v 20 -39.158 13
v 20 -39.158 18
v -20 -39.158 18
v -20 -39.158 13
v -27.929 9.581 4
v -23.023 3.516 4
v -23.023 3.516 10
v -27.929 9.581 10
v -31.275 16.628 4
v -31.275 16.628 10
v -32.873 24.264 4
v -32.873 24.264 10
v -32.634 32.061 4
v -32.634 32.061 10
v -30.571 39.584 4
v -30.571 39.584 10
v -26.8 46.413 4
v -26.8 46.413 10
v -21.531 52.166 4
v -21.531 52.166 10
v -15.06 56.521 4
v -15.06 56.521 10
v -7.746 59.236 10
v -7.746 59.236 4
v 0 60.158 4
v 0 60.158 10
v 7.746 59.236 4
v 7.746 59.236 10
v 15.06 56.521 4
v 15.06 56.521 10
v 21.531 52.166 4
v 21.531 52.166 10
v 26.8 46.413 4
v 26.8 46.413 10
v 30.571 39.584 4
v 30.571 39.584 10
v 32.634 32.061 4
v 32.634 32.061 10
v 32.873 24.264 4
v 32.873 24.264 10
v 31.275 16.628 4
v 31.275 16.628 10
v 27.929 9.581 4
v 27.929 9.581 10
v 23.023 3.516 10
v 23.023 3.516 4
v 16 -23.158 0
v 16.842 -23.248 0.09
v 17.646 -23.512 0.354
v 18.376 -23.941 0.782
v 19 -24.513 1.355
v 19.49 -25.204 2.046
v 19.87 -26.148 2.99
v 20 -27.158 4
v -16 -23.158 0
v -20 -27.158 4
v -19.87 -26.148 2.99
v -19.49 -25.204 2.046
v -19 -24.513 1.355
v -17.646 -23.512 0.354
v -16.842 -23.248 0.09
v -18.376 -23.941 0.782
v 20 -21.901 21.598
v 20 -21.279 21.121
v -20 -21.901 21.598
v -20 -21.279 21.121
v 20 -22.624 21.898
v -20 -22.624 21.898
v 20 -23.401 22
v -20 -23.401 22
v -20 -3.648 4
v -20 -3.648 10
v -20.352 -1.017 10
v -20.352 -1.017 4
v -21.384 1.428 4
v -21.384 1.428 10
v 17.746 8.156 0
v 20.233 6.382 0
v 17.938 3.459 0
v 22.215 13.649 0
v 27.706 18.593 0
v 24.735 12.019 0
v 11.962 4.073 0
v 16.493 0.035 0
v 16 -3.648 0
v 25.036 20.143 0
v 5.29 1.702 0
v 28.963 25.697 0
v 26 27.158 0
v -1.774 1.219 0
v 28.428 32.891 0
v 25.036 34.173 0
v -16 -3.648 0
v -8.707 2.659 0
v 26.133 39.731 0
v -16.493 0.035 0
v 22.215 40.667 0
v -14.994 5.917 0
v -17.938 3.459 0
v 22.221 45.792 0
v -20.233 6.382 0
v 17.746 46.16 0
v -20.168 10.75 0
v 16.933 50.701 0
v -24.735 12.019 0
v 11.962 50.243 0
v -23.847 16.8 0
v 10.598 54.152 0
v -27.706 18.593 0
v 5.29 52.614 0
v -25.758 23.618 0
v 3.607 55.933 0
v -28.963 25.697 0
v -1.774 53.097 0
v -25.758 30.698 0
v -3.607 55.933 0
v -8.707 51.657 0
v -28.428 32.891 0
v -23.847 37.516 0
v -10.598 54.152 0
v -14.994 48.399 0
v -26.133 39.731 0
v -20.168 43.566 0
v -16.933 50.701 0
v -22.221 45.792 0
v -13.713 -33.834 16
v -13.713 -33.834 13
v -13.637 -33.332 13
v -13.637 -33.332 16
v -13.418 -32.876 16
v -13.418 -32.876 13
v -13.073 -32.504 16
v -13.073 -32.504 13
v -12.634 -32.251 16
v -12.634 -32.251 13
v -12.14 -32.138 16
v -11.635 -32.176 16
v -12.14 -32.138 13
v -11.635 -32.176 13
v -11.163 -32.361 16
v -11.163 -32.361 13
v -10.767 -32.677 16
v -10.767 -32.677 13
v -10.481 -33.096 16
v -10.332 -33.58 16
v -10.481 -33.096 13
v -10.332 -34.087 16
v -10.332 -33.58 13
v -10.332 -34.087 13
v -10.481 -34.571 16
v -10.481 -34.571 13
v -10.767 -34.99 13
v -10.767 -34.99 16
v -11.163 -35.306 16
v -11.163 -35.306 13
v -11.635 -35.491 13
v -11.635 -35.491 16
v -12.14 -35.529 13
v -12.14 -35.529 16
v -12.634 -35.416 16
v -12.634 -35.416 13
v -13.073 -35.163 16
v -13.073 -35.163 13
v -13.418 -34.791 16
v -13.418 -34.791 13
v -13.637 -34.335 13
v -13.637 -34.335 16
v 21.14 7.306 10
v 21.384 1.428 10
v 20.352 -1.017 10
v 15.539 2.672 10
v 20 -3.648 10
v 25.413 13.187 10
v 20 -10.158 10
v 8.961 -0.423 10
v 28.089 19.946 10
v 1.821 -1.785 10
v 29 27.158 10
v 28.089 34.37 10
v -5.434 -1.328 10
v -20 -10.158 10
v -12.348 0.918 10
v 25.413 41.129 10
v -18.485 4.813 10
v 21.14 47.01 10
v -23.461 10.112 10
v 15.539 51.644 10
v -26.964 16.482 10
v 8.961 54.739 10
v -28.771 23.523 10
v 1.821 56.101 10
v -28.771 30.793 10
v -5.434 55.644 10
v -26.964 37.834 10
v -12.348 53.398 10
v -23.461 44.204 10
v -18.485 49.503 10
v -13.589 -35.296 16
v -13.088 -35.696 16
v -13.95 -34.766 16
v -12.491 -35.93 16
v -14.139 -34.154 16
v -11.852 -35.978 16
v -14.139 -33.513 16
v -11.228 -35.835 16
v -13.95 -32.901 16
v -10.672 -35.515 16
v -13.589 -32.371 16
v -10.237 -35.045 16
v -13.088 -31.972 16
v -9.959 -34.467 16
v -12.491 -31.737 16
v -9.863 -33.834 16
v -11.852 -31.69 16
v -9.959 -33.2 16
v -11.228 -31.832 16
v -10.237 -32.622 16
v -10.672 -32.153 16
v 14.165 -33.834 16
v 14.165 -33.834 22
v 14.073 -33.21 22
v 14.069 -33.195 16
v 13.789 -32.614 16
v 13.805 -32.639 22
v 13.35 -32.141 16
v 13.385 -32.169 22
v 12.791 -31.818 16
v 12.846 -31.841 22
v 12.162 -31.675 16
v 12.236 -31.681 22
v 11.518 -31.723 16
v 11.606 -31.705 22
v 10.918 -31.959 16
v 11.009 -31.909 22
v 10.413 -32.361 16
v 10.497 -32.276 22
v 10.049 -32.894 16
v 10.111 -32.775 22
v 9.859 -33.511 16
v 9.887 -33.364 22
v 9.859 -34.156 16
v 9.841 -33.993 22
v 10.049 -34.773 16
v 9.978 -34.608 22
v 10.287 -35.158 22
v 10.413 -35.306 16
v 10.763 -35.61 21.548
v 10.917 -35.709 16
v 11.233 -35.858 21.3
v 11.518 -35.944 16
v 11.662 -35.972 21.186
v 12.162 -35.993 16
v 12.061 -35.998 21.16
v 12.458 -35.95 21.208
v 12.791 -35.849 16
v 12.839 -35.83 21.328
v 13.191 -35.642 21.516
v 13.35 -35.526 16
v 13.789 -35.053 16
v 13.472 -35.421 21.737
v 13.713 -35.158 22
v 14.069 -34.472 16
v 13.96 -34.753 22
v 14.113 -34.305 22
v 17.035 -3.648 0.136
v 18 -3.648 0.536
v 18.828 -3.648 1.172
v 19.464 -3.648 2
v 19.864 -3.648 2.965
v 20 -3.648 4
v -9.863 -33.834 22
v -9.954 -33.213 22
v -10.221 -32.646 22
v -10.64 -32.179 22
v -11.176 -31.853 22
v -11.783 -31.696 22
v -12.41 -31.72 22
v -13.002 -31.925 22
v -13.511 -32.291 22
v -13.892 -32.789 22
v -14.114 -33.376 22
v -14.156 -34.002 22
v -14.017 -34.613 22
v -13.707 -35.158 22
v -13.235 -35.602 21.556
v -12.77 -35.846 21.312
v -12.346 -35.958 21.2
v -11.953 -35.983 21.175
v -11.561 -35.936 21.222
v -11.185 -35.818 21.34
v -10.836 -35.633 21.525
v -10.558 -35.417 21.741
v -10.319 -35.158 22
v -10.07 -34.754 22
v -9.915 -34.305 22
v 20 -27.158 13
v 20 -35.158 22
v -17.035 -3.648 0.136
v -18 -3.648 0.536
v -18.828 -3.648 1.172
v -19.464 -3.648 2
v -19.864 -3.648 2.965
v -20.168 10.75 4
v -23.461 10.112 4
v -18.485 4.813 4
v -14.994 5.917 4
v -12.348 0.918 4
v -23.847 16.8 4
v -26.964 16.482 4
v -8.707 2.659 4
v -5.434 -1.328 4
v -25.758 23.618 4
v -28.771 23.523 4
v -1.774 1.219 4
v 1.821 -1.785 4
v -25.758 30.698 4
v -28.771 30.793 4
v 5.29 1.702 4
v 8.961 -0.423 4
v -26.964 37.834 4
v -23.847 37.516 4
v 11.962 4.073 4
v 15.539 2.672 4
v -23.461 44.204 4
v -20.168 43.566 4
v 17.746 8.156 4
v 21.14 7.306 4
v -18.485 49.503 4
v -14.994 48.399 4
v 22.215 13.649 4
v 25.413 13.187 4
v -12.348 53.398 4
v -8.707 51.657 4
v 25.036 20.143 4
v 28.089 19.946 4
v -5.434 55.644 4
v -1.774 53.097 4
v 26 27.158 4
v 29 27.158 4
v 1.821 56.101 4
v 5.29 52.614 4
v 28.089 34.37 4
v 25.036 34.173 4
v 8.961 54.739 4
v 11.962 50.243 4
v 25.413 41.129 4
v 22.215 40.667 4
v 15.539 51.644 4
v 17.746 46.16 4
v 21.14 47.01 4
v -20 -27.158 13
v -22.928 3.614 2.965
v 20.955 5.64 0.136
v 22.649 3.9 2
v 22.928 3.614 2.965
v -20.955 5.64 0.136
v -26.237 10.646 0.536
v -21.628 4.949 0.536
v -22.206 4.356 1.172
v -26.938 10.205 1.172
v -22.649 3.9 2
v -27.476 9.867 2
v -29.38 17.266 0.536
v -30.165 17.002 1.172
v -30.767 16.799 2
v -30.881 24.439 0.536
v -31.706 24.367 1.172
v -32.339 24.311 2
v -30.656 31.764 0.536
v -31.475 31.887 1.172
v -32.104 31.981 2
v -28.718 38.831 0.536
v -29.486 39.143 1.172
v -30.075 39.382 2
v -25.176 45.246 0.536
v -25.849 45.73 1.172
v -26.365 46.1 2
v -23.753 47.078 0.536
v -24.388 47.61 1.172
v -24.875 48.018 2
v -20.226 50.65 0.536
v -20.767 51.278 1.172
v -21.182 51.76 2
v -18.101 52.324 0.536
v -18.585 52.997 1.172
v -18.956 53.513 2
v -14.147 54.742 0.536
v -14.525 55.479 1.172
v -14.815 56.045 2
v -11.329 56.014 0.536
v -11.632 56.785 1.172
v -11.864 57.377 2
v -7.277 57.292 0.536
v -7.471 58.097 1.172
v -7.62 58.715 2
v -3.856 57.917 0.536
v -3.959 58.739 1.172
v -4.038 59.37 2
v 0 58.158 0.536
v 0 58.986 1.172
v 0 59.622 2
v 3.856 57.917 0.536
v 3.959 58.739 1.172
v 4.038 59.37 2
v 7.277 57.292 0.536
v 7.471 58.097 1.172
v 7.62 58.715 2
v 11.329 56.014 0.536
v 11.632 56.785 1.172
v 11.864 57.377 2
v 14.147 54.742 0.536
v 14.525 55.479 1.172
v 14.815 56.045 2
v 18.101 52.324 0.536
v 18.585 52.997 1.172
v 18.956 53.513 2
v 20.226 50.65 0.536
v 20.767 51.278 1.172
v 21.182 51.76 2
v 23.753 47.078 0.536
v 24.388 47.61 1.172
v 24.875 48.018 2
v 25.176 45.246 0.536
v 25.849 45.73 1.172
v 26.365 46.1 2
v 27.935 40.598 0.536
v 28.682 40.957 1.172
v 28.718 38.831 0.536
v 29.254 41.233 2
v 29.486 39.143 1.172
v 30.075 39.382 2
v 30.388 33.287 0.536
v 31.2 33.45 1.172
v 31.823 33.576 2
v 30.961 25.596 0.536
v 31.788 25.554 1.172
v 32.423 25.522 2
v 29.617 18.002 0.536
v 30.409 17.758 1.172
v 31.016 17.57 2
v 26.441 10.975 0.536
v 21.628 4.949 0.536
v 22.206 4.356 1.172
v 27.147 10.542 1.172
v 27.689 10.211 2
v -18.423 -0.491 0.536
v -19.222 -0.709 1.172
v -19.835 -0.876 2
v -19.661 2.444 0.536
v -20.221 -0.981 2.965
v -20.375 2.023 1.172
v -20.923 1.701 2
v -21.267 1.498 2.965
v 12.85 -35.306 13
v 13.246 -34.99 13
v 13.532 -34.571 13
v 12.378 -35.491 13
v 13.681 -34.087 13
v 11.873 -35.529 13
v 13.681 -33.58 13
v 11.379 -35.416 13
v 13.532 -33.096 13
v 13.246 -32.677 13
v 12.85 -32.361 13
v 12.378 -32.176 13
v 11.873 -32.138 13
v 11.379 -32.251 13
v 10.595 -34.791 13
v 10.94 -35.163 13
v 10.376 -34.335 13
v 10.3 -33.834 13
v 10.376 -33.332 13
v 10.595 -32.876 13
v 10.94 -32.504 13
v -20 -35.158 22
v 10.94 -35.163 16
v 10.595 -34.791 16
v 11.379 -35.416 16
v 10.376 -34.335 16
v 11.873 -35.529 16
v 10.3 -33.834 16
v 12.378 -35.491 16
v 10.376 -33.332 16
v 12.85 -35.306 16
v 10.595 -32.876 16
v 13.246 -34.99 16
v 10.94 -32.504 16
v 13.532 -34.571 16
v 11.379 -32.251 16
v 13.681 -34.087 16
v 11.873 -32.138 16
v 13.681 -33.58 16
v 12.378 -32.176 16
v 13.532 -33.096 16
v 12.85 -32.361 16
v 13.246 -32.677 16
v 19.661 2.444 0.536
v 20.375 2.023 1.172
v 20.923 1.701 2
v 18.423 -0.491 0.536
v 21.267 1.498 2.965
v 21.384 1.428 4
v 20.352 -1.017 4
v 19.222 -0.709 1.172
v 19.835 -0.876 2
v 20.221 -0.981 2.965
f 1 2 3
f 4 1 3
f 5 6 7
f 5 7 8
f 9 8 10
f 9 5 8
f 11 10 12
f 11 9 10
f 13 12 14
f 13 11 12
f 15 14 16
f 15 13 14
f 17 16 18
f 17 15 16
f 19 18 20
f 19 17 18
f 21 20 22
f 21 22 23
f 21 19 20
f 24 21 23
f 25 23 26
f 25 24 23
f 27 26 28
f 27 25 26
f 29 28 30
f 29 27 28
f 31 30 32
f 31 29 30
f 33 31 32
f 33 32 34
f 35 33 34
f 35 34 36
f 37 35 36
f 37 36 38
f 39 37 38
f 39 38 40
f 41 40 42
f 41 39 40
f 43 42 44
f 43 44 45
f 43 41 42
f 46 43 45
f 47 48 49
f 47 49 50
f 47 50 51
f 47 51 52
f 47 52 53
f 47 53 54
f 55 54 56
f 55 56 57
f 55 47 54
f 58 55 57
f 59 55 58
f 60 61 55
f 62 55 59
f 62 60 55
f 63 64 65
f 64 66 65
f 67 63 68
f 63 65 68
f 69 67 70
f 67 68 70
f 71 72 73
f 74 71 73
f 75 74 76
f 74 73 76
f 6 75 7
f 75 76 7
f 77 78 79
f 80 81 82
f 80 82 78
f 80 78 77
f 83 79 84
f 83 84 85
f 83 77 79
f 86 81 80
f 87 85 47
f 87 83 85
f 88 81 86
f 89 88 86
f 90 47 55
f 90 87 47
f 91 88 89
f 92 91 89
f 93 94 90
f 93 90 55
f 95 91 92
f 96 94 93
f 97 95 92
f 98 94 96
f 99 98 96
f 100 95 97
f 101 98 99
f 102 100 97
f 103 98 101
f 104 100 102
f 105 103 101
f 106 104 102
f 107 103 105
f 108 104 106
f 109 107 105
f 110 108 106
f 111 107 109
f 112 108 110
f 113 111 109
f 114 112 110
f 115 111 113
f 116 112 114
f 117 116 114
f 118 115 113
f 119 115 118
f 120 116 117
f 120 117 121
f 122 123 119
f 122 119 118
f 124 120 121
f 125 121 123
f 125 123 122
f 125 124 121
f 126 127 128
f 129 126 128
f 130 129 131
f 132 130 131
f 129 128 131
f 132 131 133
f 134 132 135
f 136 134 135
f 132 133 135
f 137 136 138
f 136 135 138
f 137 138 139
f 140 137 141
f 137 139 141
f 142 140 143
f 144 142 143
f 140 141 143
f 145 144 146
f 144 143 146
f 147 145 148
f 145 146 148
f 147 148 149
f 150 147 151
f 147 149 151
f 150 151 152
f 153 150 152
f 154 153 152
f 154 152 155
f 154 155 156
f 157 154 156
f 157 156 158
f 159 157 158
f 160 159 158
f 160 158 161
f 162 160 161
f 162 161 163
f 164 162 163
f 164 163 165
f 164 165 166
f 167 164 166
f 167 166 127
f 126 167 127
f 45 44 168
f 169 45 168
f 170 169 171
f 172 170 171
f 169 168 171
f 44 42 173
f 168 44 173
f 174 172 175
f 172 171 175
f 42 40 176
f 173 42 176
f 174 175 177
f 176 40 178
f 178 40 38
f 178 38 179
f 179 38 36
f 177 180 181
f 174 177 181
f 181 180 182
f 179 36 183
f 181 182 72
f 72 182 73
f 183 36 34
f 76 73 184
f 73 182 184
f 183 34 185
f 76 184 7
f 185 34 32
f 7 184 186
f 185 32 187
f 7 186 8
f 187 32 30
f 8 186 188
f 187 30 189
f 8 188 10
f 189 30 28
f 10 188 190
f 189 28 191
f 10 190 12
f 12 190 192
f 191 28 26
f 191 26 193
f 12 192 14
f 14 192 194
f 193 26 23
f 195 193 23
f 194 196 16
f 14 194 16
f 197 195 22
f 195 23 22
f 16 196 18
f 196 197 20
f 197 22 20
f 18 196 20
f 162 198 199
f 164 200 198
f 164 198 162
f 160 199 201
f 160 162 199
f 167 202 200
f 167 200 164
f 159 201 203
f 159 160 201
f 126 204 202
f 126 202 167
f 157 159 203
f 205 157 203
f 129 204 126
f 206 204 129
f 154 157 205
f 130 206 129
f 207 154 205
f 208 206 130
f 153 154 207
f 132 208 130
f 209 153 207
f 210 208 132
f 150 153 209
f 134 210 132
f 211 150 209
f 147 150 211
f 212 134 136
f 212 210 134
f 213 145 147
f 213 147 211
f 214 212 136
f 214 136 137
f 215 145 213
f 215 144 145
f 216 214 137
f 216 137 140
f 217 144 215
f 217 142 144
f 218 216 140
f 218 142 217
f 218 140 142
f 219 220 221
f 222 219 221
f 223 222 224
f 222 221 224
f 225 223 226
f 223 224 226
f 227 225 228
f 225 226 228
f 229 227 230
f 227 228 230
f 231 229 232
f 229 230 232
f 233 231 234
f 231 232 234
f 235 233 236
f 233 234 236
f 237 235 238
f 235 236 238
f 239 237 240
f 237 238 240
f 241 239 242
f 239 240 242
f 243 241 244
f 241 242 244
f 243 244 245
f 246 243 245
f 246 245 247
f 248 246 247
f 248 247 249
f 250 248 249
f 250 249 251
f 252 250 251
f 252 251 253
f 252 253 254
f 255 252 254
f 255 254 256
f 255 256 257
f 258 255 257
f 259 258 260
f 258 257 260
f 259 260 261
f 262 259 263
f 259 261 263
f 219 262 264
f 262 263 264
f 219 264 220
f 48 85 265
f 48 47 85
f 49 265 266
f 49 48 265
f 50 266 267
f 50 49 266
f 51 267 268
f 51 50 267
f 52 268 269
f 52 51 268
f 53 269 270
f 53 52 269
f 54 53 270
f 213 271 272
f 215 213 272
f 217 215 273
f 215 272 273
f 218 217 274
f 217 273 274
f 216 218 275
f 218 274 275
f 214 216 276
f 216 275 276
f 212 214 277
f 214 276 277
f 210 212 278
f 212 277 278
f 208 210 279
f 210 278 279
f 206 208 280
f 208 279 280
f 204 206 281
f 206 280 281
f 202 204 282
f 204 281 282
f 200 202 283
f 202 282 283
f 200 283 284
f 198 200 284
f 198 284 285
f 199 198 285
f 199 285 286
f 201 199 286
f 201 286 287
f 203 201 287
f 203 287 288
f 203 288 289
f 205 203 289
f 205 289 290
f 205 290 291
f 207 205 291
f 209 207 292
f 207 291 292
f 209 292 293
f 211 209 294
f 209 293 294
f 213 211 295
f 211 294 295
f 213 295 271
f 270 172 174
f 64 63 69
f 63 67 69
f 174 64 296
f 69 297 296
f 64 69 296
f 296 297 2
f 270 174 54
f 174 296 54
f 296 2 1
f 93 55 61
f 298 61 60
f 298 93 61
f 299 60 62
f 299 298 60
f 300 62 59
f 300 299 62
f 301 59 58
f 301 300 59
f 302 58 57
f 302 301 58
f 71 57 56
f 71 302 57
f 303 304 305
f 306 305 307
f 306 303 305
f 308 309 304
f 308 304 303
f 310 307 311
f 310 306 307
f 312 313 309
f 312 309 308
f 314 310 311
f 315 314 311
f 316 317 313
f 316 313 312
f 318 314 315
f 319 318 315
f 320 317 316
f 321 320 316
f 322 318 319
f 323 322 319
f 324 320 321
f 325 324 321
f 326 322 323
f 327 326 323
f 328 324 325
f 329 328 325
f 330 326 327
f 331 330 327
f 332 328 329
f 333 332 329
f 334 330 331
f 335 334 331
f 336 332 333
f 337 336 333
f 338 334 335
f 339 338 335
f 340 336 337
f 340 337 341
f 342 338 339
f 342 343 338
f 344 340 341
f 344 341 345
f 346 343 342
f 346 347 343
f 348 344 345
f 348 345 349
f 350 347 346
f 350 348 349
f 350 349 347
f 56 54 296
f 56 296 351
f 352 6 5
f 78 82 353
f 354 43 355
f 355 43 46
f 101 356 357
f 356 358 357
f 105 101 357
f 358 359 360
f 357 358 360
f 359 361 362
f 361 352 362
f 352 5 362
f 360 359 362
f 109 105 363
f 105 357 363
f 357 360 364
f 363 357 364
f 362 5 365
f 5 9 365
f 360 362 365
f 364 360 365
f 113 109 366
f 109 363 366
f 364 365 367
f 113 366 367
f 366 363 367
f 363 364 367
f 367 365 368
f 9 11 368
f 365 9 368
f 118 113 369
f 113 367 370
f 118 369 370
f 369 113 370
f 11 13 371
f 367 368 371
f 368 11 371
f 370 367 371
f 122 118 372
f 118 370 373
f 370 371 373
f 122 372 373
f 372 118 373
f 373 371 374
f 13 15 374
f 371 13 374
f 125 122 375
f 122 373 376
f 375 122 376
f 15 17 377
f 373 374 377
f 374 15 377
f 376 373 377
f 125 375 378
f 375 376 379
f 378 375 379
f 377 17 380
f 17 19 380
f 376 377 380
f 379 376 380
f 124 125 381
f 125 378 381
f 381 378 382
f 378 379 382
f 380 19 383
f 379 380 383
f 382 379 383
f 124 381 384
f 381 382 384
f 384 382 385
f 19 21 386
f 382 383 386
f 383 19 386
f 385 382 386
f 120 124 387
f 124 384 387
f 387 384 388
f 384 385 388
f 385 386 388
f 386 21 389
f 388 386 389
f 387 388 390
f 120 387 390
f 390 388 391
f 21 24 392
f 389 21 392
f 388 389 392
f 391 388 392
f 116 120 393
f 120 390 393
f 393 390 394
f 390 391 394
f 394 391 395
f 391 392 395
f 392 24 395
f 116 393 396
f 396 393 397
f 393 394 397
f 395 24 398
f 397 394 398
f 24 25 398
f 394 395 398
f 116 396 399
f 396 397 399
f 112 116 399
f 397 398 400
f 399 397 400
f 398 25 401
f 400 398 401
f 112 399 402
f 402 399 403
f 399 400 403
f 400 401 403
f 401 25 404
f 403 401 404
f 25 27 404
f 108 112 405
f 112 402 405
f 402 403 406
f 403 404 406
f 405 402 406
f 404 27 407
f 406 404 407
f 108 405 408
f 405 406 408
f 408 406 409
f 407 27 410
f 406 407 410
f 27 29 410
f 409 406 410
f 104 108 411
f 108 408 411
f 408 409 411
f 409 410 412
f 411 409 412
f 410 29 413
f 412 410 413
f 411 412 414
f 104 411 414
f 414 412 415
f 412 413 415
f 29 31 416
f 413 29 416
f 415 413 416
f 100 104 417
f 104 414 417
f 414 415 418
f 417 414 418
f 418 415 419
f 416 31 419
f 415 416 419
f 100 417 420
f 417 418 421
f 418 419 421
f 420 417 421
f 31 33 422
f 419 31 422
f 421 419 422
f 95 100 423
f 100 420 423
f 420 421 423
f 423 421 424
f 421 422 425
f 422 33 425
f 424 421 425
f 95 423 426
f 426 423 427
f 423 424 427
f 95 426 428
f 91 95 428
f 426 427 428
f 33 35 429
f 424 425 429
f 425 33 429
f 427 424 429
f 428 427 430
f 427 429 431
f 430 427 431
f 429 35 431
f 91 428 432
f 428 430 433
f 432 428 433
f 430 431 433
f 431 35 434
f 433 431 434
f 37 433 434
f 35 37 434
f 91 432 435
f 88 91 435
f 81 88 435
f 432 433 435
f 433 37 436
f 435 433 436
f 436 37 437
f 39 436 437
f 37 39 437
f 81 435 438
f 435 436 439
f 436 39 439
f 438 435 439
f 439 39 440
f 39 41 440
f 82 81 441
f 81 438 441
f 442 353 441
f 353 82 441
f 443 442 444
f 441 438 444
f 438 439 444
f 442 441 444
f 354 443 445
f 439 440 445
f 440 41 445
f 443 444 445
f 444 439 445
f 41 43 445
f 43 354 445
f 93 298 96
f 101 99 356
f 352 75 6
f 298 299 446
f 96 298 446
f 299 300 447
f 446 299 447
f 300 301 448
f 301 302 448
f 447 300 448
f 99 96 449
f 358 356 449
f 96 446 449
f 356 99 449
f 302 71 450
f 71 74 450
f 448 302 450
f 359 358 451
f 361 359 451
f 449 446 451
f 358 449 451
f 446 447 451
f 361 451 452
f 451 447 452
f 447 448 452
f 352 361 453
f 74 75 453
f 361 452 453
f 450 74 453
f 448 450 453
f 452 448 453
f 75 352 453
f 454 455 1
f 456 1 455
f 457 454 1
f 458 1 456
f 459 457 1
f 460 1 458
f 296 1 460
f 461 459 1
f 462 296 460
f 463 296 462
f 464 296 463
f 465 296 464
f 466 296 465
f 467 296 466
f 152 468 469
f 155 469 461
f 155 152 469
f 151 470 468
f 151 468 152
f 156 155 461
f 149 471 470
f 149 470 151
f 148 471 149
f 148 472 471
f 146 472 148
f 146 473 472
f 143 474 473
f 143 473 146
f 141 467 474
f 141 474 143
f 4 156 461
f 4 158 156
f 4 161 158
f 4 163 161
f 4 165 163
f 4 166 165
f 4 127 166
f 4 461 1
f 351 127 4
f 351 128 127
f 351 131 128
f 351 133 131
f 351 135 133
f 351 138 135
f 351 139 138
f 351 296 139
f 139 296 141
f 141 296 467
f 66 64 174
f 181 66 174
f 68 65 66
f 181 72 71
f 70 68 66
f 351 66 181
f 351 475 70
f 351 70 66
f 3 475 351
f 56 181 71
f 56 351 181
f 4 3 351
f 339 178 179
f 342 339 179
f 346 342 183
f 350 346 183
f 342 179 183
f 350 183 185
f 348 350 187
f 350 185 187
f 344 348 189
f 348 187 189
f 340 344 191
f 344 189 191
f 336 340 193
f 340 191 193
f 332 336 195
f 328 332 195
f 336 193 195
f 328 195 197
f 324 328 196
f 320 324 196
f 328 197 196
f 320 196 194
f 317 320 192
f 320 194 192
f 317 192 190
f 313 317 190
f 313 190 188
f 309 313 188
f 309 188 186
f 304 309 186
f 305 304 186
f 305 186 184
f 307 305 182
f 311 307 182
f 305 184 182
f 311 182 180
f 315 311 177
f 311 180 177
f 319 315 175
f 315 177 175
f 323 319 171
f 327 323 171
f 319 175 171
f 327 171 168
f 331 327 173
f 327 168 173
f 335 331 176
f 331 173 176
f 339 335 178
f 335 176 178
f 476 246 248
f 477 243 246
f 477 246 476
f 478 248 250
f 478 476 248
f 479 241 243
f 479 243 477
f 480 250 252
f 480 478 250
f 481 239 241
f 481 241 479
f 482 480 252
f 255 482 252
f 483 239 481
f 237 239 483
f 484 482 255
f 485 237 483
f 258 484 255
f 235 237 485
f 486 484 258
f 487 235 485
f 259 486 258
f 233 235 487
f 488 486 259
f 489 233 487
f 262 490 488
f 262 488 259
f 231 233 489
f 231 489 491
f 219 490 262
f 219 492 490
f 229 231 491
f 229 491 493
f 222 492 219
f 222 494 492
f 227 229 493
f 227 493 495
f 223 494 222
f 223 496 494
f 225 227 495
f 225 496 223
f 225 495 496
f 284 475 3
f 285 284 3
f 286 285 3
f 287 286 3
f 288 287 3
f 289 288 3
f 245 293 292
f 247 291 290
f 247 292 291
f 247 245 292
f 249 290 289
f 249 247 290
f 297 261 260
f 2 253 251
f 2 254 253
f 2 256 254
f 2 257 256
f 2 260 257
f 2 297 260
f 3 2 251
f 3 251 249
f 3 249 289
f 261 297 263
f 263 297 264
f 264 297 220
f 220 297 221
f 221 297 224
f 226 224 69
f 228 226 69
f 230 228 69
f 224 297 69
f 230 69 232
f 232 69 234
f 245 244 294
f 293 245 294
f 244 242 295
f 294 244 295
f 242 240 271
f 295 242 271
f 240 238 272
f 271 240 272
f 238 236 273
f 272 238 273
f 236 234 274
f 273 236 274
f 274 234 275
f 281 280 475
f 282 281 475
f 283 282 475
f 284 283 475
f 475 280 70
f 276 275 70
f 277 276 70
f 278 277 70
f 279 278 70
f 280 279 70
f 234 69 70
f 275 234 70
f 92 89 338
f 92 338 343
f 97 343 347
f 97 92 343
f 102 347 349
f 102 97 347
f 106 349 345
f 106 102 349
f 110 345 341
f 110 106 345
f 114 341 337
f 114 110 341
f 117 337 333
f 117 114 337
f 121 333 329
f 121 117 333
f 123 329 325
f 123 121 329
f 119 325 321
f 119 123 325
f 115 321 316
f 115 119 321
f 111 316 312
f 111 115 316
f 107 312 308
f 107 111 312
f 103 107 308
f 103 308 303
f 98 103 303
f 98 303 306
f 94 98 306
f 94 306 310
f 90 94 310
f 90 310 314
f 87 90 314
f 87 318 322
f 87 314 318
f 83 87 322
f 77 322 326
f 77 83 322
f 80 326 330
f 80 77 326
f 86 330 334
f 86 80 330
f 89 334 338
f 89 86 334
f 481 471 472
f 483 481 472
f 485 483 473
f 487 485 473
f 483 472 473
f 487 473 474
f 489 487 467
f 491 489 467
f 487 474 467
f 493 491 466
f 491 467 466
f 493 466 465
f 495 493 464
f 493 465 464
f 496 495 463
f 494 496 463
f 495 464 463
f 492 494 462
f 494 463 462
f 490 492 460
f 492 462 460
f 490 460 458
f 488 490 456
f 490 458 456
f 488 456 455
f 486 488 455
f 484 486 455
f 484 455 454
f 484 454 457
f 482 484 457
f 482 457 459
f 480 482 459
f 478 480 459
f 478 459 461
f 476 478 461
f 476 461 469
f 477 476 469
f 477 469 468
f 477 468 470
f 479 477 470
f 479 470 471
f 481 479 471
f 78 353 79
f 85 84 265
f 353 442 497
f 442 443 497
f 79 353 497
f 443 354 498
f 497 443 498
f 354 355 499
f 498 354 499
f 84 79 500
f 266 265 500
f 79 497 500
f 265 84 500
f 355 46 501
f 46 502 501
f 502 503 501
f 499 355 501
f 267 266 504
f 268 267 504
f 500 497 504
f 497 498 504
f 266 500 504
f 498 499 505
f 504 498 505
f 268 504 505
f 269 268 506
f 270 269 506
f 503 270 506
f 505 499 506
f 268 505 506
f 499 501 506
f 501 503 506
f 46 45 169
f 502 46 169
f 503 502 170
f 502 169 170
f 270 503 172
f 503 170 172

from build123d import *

# Parameters (mm, degrees)
SKETCH_1_R          = 26
EXTRUDE_1_DEPTH     = 10
SKETCH_3_R          = 29
CUT_EXTRUDE_1_DEPTH = 6
SKETCH_4_W          = 40
SKETCH_4_H          = 12
EXTRUDE_2_DEPTH     = 12
SKETCH_5_W          = 40
SKETCH_5_H          = 12
EXTRUDE_3_DEPTH     = 2
SKETCH_6_W          = 40
SKETCH_6_H          = 12
EXTRUDE_4_DEPTH     = 3
CHAMFER_1_SIZE      = 14
SKETCH_7_R          = 1.7
CUT_EXTRUDE_2_DEPTH = 14
SKETCH_8_R          = 2.15
SKETCH_8_R_2        = 2.165
CUT_EXTRUDE_3_DEPTH = 6
SKETCH_9_W          = 40
SKETCH_9_H          = 12
CUT_EXTRUDE_4_DEPTH = 5
CHAMFER_2_SIZE      = 4
CHAMFER_3_SIZE      = 4
FILLET_5_R          = 10
FILLET_6_R          = 4
FILLET_7_R          = 3


with BuildPart() as part:
    # 草图1 → 凸台-拉伸1 (new body)
    with BuildSketch(Plane.XY):
        with BuildLine():
            Line((20, -27.158003748), (-20, -27.158003748))
            Line((-20, -27.158003748), (-20, 0.909194251))
            ThreePointArc((-20, 0.909194251), (0, 60.158003748), (20, 0.909194251))
            Line((20, 0.909194251), (20, -27.158003748))
        make_face()
        with Locations((0, 27.158003748)):
            Circle(SKETCH_1_R, mode=Mode.SUBTRACT)
    extrude(amount=EXTRUDE_1_DEPTH)

    # 草图3 → 切除-拉伸1 (cut)
    with BuildSketch(Plane.XY.offset(10)):
        with Locations((0, 27.158003748)):
            Circle(SKETCH_3_R)
    extrude(amount=-CUT_EXTRUDE_1_DEPTH, mode=Mode.SUBTRACT)



with BuildPart() as body_2:
    # 草图4 → 凸台-拉伸2 (new body)
    with BuildSketch(Plane.XY.offset(10)):
        with Locations((0, -33.158003748)):
            Rectangle(SKETCH_4_W, SKETCH_4_H)
    extrude(amount=EXTRUDE_2_DEPTH)


with BuildPart() as part_1:
    add(part.part)

    add(body_2.part)  # 凸台-拉伸3 merges body 2
    # 草图5 → 凸台-拉伸3 (add)
    with BuildSketch(Plane(origin=(0, 0, 10), x_dir=(-1, 0, 0), z_dir=(0, 0, -1))):
        with Locations((0, -33.158003748)):
            Rectangle(SKETCH_5_W, SKETCH_5_H)
    extrude(amount=EXTRUDE_3_DEPTH)

    # 草图6 → 凸台-拉伸4 (add)
    with BuildSketch(Plane(origin=(0, -27.158003748, 0), x_dir=(1, 0, 0), z_dir=(0, 1, 0))):
        with Locations((0, -16)):
            Rectangle(SKETCH_6_W, SKETCH_6_H)
    extrude(amount=EXTRUDE_4_DEPTH)

    # 倒角1
    # the kernel refuses this chamfer: 14 mm, written as the material it adds along each edge
    with BuildSketch(Plane(origin=(-20, -24.158003748, 10), x_dir=(0, -0.027495876610586365, 0.9996219169112968), z_dir=(1, 0, 0))) as chamfer_1_piece_1_section:
        Polygon((CHAMFER_1_SIZE * 0.999621916911, -CHAMFER_1_SIZE * 0.0274958766106), (-CHAMFER_1_SIZE * 0.0274958766106, -CHAMFER_1_SIZE * 0.999621916911), (0, 0), align=None)
    chamfer_1_piece_1 = extrude(amount=40, mode=Mode.PRIVATE)
    chamfer_1_piece_1 = split(chamfer_1_piece_1, bisect_by=Plane(origin=(0, -19.403075602, 22), z_dir=(0, 0, -1)), keep=Keep.TOP, mode=Mode.PRIVATE)
    add(chamfer_1_piece_1)

    # 草图7 → 切除-拉伸2 (cut)
    with BuildSketch(Plane(origin=(0, 0, 8), x_dir=(-1, 0, 0), z_dir=(0, 0, -1))):
        with Locations((-12, -33.833568363)):
            Circle(SKETCH_7_R)
        with Locations((12.012999622, -33.833568363)):
            Circle(SKETCH_7_R)
    extrude(amount=-CUT_EXTRUDE_2_DEPTH, mode=Mode.SUBTRACT)

    # 草图8 → 切除-拉伸3 (cut)
    with BuildSketch(Plane.XY.offset(22)):
        with Locations((-12.012999622, -33.833568363)):
            Circle(SKETCH_8_R)
        with Locations((12, -33.833568363)):
            Circle(SKETCH_8_R_2)
    extrude(amount=-CUT_EXTRUDE_3_DEPTH, mode=Mode.SUBTRACT)

    # 草图9 → 切除-拉伸4 (cut)
    with BuildSketch(Plane(origin=(0, 0, 8), x_dir=(-1, 0, 0), z_dir=(0, 0, -1))):
        with Locations((0, -33.158003748)):
            Rectangle(SKETCH_9_W, SKETCH_9_H)
    extrude(amount=-CUT_EXTRUDE_4_DEPTH, mode=Mode.SUBTRACT)

    # 倒角2
    # the kernel refuses this chamfer: 4 mm, written as the material it takes off along each edge
    with BuildSketch(Plane(origin=(30.286731952, -39.158003748, 22), x_dir=(0, 0.9996219169112968, 0.02749587661058651), z_dir=(-1, 0, 0))) as chamfer_2_piece_1:
        Polygon((CHAMFER_2_SIZE * 0.999621916911, CHAMFER_2_SIZE * 0.0274958766106), (-CHAMFER_2_SIZE * 0.0274958766106, CHAMFER_2_SIZE * 0.999621916911), (0, 0), align=None)
    extrude(amount=60.573463904, mode=Mode.SUBTRACT)

    # 倒角3
    chamfer_3_edges = [part_1.edges().sort_by_distance(p)[0] for p in [
        (0, -27.158003748, 0),
    ]]
    chamfer(chamfer_3_edges, length=CHAMFER_3_SIZE)

    # 圆角5
    fillet_5_edges = [part_1.edges().sort_by_distance(p)[0] for p in [
        (-20, 0.909194251, 5),
        (20, 0.909194251, 5),
    ]]
    fillet(fillet_5_edges, radius=FILLET_5_R)

    # 圆角6
    fillet_6_edges = [part_1.edges().sort_by_distance(p)[0] for p in [
        (0, 60.158003748, 0),
        (-20, -13.402921801, 0),
        (-20.786763819, 0.240126076, 0),
        (20.786763819, 0.240126076, 0),
        (20, -13.402921801, 0),
    ]]
    fillet(fillet_6_edges, radius=FILLET_6_R)

    # 圆角7
    fillet_7_edges = [part_1.edges().sort_by_distance(p)[0] for p in [
        (0, -22.158003748, 22),
    ]]
    fillet(fillet_7_edges, radius=FILLET_7_R)


solid = part_1.part
